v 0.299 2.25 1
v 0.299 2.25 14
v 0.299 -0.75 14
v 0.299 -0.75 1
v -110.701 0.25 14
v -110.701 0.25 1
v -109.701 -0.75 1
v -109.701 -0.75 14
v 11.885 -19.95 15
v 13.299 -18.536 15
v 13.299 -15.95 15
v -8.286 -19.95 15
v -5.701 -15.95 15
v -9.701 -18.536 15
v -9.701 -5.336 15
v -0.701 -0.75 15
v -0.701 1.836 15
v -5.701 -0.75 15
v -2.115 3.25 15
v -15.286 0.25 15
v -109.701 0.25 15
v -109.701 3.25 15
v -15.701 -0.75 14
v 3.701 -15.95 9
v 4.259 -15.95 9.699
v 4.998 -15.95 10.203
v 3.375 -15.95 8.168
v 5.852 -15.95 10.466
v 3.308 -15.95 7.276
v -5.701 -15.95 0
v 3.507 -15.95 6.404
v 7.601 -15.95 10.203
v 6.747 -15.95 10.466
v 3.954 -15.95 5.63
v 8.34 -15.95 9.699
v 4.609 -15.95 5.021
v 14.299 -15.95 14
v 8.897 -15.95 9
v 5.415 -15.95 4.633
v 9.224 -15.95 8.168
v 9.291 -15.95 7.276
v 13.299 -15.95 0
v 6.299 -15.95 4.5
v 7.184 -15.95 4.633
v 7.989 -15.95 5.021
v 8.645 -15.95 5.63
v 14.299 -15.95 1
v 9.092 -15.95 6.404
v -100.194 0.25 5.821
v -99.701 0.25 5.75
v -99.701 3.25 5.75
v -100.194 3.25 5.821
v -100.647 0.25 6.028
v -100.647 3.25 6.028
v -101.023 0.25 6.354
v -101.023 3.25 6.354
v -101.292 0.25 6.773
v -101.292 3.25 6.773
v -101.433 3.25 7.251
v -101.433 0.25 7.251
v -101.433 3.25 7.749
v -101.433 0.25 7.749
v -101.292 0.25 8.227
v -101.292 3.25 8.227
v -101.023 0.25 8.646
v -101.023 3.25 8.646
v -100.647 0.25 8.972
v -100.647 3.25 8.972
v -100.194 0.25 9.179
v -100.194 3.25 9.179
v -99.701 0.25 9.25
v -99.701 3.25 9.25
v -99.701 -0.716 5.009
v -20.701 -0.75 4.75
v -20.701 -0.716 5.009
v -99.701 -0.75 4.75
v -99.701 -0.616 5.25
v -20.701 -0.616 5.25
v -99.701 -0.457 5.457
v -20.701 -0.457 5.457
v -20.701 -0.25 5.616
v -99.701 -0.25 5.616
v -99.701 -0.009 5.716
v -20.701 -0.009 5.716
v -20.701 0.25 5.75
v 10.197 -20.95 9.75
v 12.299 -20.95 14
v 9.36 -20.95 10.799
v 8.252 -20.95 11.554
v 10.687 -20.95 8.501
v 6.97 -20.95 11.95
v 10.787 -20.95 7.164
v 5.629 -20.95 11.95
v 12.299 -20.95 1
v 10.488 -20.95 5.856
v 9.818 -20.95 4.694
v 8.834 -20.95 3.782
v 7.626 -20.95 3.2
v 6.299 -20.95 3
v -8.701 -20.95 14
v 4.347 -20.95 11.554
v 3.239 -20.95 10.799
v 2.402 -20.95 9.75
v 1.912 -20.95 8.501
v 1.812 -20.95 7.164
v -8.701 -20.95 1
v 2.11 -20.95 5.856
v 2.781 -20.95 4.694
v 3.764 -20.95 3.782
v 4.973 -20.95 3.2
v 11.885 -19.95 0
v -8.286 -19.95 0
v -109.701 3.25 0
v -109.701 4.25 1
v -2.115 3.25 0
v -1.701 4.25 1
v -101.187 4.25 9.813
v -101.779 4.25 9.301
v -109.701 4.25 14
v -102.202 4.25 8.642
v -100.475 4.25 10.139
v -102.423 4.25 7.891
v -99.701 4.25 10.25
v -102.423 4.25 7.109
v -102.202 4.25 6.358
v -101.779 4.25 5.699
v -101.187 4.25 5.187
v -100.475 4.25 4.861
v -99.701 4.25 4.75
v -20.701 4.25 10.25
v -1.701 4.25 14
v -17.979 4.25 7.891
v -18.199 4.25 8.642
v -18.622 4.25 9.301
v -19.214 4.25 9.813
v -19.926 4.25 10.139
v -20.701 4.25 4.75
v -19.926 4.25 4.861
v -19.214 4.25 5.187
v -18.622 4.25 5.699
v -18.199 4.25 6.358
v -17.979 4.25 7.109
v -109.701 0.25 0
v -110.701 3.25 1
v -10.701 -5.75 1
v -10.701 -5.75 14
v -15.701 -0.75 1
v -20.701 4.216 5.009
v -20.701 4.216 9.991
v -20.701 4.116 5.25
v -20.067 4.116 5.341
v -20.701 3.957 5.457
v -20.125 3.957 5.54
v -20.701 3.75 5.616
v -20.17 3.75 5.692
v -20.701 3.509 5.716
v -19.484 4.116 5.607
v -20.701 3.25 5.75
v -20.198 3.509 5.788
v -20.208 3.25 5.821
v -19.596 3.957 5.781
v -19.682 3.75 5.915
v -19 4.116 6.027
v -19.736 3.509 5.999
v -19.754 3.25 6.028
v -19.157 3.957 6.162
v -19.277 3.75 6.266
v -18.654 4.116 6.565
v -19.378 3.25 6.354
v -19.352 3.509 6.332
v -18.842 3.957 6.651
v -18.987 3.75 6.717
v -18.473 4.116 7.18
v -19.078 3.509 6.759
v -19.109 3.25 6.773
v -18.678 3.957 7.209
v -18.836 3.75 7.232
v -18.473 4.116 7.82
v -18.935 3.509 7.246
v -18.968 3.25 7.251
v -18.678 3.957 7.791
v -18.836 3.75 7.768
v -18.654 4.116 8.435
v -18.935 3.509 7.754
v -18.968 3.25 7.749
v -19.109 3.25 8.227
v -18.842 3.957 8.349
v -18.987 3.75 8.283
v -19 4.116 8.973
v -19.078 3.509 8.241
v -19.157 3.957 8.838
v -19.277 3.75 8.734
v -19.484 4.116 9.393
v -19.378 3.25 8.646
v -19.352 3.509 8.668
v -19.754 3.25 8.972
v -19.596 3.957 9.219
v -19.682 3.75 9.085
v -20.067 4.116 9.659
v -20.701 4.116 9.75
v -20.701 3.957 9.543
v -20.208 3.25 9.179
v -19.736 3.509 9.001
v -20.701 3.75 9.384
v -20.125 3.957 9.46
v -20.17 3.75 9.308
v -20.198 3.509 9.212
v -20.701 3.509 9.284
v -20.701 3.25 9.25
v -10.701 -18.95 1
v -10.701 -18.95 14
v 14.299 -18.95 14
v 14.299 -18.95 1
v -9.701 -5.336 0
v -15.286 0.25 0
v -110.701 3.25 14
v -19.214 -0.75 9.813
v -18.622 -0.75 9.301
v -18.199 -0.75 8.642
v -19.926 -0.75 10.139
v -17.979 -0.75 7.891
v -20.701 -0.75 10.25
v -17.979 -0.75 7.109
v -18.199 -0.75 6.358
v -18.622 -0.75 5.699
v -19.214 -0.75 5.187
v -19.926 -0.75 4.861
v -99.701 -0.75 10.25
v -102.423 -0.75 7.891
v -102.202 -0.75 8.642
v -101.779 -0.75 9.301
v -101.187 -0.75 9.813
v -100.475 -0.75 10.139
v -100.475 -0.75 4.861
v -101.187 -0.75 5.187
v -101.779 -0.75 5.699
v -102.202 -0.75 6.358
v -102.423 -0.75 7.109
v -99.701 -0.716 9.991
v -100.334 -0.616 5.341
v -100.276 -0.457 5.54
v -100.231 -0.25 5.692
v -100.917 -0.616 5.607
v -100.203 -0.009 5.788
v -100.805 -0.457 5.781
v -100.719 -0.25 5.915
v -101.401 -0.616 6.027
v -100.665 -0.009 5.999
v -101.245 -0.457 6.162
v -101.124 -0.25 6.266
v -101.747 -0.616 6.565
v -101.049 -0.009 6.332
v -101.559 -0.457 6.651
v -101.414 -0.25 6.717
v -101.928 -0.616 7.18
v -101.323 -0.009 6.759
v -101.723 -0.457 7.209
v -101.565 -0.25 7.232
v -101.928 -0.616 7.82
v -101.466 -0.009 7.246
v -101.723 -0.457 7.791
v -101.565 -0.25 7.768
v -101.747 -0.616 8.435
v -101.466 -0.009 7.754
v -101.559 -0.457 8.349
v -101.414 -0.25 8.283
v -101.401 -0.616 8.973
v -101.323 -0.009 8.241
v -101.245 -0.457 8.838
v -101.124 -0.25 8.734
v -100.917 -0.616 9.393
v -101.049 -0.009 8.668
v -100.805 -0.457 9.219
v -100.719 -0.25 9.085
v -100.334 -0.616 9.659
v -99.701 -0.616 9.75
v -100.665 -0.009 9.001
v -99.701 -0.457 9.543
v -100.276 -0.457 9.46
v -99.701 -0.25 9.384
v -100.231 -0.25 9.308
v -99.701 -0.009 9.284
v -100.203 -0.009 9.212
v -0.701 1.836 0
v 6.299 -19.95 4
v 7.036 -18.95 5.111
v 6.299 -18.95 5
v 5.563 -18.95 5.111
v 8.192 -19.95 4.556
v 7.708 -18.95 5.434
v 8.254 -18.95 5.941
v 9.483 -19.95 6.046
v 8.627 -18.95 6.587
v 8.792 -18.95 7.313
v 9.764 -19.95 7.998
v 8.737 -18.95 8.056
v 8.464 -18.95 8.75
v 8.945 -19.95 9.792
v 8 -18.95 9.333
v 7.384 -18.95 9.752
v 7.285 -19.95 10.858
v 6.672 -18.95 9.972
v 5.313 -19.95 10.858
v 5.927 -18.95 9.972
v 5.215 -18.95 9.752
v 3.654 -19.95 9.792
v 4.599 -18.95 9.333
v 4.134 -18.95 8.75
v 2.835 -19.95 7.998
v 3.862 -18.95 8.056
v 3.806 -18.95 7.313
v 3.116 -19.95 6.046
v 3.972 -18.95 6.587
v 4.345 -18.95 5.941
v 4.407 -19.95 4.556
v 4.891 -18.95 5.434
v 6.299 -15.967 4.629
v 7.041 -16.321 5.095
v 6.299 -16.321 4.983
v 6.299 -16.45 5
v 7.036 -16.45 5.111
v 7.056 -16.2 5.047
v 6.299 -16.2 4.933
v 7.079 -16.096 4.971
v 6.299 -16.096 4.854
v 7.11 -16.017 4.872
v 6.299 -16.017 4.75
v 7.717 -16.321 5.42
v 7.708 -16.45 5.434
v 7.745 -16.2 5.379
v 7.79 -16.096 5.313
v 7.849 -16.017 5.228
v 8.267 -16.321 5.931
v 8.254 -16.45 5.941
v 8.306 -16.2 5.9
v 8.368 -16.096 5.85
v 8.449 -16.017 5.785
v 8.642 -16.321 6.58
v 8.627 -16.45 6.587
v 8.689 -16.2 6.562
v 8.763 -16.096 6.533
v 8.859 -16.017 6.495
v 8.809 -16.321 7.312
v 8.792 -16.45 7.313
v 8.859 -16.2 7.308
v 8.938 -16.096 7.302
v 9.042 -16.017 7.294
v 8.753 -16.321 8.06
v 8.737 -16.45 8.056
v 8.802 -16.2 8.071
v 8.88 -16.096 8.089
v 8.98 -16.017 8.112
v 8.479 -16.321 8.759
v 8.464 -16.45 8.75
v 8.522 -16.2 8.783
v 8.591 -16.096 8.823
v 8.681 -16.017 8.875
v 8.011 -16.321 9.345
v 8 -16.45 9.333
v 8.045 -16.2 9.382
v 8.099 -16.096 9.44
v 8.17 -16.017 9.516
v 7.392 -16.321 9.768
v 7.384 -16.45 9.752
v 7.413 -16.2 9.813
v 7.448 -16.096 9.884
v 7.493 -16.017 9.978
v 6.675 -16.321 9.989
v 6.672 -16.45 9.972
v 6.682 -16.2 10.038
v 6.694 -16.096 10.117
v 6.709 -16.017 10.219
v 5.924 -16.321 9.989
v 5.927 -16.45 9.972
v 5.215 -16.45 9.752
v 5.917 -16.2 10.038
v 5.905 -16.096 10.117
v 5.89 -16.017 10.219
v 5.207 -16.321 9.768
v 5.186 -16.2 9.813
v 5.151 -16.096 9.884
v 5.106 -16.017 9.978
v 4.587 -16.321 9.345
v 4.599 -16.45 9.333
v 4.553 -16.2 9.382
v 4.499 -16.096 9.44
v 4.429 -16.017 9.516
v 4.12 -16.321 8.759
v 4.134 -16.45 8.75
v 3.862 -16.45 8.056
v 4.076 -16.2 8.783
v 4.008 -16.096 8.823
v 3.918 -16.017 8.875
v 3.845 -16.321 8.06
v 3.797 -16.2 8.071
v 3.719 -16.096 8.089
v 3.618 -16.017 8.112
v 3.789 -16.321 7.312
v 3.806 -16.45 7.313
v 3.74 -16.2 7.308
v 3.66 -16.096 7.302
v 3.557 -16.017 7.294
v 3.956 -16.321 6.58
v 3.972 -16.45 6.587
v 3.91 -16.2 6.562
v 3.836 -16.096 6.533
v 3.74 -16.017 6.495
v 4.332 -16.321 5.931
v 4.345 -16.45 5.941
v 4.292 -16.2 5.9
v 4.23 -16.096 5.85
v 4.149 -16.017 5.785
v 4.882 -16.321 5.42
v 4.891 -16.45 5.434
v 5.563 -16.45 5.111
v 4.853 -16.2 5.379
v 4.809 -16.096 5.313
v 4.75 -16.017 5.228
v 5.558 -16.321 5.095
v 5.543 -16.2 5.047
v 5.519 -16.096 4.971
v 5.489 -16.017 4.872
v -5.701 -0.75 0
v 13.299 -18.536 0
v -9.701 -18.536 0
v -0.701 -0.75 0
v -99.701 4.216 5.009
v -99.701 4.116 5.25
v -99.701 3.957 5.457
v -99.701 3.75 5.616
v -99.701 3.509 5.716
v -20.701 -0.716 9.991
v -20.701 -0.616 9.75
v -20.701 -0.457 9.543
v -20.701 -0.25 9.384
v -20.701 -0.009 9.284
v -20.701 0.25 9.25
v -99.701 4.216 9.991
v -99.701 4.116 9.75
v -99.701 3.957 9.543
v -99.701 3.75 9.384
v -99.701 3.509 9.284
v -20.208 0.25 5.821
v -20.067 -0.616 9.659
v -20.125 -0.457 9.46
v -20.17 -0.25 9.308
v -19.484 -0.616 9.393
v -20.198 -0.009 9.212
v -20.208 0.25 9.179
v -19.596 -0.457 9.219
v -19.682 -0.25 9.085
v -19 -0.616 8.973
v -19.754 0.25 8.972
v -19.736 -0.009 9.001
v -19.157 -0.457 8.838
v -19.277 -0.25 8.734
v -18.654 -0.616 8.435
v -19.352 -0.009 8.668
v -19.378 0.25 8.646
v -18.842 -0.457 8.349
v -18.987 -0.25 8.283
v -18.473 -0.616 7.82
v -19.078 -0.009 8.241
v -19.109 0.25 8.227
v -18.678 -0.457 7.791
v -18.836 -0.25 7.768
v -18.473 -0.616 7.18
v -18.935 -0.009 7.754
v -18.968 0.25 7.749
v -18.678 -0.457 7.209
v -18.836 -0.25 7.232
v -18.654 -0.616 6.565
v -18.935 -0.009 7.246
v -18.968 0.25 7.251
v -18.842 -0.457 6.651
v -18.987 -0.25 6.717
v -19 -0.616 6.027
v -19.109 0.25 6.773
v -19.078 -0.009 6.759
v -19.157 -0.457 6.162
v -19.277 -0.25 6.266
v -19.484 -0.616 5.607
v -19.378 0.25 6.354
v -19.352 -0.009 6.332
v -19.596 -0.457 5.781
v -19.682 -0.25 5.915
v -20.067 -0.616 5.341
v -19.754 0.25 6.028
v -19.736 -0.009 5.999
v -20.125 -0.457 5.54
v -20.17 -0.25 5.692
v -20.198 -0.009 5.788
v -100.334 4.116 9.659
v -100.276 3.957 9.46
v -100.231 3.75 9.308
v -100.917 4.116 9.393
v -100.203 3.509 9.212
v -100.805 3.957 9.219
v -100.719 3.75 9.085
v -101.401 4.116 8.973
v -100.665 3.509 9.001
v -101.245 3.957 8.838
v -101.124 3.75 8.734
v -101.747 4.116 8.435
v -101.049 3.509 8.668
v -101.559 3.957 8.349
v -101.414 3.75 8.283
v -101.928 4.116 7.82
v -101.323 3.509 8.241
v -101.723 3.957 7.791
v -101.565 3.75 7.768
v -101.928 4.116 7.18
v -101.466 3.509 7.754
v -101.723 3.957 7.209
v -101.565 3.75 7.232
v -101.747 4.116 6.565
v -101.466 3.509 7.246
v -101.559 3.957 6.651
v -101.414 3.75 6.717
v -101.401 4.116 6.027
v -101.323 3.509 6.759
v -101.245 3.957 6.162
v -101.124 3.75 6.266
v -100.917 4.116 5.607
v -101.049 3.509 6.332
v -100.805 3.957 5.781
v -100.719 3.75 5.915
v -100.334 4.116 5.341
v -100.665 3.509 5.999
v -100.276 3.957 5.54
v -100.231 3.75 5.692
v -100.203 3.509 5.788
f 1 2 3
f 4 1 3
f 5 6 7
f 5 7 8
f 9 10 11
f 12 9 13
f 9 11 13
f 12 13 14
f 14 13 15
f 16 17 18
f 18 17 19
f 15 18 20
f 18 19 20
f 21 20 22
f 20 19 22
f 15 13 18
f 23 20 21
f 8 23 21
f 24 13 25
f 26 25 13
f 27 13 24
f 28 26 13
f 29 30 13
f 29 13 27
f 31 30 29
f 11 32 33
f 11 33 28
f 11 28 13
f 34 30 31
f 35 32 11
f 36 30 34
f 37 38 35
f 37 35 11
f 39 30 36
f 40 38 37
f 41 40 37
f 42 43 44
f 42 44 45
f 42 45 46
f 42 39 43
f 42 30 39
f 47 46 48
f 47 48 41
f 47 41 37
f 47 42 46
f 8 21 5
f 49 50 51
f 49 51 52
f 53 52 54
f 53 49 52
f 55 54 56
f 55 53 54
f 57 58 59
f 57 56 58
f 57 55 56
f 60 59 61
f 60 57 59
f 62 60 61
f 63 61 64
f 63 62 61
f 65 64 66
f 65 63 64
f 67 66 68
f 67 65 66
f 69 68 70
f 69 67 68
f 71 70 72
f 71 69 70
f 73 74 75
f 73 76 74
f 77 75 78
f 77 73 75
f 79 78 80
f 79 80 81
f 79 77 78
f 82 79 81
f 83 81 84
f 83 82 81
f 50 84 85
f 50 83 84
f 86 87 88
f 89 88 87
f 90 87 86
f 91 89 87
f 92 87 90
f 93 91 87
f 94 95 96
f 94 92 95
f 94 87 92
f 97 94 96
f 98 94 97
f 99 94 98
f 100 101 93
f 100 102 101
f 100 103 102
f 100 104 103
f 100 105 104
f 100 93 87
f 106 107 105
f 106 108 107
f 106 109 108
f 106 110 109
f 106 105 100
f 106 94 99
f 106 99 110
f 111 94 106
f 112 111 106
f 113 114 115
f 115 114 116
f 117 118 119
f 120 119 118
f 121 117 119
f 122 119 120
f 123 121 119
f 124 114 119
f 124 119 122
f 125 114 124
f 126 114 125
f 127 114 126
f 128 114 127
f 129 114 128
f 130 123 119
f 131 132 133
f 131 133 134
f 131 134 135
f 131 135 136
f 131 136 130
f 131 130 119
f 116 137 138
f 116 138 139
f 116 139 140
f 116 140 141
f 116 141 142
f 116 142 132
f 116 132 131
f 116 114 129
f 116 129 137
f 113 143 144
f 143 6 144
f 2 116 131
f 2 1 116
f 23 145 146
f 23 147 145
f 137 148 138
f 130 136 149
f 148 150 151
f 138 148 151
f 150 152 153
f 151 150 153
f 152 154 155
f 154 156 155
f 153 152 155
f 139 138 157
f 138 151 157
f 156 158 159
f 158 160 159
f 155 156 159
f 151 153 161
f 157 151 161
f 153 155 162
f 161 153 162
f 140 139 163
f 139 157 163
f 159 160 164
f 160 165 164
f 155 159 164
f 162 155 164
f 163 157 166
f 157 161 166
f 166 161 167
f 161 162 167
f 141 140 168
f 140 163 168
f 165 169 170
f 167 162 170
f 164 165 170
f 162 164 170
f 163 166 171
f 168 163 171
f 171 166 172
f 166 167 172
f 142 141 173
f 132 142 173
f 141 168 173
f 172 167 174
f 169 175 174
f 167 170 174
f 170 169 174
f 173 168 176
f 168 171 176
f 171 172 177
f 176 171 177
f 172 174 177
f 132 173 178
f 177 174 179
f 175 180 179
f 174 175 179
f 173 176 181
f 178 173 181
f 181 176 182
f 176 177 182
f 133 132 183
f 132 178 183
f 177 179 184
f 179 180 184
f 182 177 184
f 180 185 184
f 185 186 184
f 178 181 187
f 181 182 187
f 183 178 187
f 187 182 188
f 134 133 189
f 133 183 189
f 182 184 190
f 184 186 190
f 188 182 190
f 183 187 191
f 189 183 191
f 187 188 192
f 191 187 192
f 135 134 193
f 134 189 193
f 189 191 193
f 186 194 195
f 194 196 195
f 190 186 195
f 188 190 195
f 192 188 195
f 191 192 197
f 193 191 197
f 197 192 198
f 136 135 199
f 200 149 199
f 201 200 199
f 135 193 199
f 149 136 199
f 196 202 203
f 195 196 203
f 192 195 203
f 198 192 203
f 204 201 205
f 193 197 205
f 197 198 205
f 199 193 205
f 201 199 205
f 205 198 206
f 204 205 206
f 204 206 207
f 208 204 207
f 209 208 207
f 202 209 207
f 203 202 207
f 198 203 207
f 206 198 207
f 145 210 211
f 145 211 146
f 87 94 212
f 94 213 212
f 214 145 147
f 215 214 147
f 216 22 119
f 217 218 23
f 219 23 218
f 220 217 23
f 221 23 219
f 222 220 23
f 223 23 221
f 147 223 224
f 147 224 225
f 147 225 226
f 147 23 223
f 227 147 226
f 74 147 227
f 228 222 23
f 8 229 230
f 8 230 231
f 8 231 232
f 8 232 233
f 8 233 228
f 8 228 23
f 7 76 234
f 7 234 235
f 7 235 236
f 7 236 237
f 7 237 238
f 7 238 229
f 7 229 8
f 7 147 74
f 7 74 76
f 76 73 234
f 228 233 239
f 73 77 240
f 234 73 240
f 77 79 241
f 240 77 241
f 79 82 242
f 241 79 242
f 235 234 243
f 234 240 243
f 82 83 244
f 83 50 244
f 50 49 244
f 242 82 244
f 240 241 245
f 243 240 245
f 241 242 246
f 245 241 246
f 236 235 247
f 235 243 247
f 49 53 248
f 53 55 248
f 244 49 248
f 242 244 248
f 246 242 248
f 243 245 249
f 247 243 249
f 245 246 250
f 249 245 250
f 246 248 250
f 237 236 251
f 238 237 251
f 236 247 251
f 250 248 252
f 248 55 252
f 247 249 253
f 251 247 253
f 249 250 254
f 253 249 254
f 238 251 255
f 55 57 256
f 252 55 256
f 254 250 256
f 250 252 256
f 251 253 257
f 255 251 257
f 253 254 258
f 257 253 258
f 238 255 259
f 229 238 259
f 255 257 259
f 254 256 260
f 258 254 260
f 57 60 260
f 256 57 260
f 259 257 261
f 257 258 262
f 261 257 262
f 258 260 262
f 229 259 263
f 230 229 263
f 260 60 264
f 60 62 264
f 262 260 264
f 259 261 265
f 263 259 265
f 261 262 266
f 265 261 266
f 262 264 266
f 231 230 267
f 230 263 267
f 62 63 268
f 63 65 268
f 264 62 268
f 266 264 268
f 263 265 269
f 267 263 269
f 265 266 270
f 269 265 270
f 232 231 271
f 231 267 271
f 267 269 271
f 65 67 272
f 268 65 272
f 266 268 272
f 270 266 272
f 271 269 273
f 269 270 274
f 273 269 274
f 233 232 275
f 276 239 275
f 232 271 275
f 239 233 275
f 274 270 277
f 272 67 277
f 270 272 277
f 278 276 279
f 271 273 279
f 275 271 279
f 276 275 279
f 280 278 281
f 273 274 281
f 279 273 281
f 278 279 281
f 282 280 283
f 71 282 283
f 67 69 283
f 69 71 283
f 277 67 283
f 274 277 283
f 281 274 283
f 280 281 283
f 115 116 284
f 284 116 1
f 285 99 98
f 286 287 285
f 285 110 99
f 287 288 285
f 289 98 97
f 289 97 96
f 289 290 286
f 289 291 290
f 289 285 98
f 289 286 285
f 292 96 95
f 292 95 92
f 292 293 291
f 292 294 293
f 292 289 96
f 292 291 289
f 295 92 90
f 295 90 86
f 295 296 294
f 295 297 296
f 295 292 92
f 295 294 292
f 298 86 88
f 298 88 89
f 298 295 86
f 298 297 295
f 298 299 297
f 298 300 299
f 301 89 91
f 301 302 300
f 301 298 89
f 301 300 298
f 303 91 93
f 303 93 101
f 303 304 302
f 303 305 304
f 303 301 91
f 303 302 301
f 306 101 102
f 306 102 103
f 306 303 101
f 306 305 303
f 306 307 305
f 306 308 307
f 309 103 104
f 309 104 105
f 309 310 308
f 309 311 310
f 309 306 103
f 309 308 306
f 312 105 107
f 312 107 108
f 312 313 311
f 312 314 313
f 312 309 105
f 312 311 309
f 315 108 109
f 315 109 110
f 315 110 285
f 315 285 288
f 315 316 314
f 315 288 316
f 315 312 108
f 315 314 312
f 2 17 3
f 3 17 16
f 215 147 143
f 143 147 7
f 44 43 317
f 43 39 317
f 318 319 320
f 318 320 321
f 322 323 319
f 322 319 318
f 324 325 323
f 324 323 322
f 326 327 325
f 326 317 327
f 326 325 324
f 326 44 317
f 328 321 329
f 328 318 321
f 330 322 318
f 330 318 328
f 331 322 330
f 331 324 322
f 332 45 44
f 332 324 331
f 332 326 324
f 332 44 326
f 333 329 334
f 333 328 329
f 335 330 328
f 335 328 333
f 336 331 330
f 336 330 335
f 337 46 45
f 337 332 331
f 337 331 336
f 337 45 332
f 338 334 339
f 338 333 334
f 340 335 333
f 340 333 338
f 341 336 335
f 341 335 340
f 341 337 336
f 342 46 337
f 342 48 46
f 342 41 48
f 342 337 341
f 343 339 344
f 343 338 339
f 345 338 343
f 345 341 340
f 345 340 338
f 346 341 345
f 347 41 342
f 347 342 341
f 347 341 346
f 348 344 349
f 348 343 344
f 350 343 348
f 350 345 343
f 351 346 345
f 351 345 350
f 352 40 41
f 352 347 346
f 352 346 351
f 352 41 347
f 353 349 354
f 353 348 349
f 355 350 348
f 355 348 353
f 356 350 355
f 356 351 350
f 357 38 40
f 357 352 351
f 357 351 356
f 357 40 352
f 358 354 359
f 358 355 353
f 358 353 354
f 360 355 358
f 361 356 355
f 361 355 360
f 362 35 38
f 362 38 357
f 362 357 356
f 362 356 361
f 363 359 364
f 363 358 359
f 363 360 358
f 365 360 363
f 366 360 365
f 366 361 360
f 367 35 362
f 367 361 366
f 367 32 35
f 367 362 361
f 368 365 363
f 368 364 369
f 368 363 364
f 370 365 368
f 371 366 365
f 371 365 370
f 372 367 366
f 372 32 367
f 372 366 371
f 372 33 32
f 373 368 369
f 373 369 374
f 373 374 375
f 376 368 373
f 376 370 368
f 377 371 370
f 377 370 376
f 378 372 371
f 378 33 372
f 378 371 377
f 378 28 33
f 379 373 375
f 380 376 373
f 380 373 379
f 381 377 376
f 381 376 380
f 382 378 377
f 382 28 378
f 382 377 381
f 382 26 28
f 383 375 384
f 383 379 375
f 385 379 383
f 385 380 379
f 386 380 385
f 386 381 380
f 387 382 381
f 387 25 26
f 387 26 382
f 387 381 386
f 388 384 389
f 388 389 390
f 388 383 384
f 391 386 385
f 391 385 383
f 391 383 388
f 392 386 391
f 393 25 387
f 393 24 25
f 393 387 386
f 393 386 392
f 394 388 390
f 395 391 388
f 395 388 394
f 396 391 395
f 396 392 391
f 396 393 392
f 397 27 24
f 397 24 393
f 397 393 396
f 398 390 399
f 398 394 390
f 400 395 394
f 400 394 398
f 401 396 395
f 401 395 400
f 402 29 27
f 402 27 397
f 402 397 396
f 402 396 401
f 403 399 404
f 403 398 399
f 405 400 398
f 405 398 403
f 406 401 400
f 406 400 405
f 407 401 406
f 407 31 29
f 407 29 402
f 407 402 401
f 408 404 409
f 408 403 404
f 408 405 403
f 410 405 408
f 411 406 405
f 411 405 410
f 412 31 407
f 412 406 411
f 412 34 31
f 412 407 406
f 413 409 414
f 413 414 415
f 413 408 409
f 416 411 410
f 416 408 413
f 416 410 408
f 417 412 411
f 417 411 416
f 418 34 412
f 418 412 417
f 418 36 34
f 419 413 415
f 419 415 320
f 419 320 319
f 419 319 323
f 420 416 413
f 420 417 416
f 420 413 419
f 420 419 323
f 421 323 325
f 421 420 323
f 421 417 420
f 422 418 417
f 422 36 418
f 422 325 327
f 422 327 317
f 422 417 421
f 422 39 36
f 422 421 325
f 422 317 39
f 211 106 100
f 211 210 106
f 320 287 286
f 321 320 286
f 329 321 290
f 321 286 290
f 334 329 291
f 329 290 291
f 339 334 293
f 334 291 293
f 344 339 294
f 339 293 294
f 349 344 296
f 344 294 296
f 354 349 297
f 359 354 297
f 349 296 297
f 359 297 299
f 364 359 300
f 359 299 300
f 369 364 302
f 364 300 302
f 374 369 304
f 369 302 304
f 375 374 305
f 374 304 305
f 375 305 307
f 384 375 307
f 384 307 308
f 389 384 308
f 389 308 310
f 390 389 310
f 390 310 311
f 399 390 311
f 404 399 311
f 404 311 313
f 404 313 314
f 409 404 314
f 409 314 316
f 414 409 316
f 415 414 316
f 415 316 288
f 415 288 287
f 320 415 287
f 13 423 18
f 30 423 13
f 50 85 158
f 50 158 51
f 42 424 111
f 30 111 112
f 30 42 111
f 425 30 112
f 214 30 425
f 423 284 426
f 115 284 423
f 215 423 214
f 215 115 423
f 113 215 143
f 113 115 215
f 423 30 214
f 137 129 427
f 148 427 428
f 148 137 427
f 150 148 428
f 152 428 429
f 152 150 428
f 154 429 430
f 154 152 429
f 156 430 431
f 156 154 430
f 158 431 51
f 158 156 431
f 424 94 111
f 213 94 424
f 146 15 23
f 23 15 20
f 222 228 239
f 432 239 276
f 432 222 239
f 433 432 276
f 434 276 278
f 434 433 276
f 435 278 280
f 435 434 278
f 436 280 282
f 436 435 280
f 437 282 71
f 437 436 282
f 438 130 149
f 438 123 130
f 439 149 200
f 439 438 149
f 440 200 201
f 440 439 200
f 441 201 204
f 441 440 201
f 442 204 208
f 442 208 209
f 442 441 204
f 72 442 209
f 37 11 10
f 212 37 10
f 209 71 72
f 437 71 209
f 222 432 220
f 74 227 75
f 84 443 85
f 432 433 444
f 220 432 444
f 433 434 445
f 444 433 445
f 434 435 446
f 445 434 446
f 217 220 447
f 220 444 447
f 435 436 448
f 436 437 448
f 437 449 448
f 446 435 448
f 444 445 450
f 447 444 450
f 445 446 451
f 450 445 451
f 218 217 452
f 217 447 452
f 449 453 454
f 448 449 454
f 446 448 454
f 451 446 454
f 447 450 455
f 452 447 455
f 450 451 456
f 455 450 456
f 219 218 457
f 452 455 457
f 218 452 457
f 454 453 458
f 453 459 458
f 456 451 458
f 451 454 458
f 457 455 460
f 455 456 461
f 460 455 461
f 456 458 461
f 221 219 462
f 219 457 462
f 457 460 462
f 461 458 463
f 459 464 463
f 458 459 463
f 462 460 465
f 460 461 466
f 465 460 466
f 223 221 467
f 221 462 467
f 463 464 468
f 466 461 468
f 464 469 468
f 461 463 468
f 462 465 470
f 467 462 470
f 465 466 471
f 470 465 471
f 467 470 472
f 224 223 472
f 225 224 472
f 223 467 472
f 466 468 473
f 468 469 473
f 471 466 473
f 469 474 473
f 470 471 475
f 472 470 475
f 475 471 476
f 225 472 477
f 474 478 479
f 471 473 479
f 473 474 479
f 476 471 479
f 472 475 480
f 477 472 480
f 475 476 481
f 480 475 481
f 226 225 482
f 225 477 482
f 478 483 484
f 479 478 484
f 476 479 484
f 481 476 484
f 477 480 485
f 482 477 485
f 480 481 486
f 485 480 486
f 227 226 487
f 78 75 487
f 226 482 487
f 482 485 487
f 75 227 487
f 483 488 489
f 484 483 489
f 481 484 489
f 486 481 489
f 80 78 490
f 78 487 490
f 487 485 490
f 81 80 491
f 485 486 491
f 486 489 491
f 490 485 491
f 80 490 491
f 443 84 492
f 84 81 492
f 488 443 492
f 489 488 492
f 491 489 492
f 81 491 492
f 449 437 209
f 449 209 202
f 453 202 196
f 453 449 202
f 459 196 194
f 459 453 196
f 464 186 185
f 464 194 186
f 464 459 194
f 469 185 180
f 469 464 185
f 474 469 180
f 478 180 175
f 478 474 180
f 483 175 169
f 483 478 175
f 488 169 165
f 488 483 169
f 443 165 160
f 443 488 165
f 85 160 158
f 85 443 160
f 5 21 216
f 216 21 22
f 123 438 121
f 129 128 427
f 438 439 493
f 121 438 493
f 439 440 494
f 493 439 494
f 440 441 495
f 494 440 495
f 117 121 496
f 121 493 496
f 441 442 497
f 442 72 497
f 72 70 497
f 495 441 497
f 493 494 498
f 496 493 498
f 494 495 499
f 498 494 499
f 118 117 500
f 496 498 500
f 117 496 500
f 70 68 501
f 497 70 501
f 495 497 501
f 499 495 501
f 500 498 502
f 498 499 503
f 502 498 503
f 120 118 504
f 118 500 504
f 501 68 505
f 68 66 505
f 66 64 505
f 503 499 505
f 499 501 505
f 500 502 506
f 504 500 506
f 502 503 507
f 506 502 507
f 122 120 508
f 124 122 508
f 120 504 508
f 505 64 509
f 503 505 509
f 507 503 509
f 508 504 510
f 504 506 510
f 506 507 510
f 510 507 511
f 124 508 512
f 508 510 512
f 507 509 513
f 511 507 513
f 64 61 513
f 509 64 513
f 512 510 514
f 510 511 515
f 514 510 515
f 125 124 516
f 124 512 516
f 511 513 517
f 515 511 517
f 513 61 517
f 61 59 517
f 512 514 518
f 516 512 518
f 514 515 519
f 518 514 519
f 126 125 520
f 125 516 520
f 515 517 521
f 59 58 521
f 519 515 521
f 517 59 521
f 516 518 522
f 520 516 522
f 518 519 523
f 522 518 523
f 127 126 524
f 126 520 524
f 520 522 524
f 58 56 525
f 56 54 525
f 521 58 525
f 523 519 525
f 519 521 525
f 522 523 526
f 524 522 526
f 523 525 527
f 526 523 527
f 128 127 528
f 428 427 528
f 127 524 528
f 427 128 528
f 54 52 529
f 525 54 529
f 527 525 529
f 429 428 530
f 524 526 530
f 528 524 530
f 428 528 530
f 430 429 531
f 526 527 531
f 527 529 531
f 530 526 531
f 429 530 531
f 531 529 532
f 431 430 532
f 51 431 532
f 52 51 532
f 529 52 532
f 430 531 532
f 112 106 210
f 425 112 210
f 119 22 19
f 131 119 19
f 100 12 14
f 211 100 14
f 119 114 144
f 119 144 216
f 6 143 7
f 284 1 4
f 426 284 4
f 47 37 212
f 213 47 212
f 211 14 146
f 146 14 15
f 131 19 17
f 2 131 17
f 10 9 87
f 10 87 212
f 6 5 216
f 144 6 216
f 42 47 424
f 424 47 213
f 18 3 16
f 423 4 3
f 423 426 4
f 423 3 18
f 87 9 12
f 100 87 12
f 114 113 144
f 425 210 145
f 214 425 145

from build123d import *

# Parameters (mm, degrees)
RESSALTO_EXTRUS_O1_DEPTH = 15
ESBO_O3_R                = 2.5
CORTE_EXTRUS_O1_DEPTH    = 15
CHANFRO1_SIZE            = 2
FILETE1_R                = 0.5
CHANFRO5_SIZE            = 2
CHANFRO7_SIZE            = 5
CHANFRO9_SIZE            = 1
CORTE_EXTRUS_O2_DEPTH    = 10
FILETE2_R                = 1


with BuildPart() as part:
    # Esboço1 → Ressalto-extrusão1 (new body)
    with BuildSketch(Plane.XY):
        Polygon((0.299414955, -0.75), (-5.700585045, -0.75), (-5.700585045, -15.95), (14.299414955, -15.95), (14.299414955, -20.95), (-10.700585045, -20.95), (-10.700585045, -0.75), (-110.700585045, -0.75), (-110.700585045, 4.25), (0.299414955, 4.25), align=None)
    extrude(amount=RESSALTO_EXTRUS_O1_DEPTH)

    # Esboço3 → Corte-extrusão1 (cut)
    with BuildSketch(Plane.XZ.offset(20.95)):
        with Locations(Location((6.299414955, 7.5, 0), (0, 0, 270))):
            Circle(ESBO_O3_R)
    extrude(amount=-CORTE_EXTRUS_O1_DEPTH, mode=Mode.SUBTRACT)

    # Chanfro1
    chanfro1_edges = [part.edges().sort_by_distance(p)[0] for p in [
        (6.299414955, -20.95, 10),
    ]]
    chamfer(chanfro1_edges, length=CHANFRO1_SIZE)

    # Filete1
    filete1_edges = [part.edges().sort_by_distance(p)[0] for p in [
        (6.299414955, -15.95, 10),
    ]]
    fillet(filete1_edges, radius=FILETE1_R)

    # Chanfro5
    chanfro5_edges = [part.edges().sort_by_distance(p)[0] for p in [
        (14.299414955, -20.95, 7.5),
        (-10.700585045, -20.95, 7.5),
        (0.299414955, 4.25, 7.5),
    ]]
    chamfer(chanfro5_edges, length=CHANFRO5_SIZE)

    # Chanfro7
    chanfro7_edges = [part.edges().sort_by_distance(p)[0] for p in [
        (-10.700585045, -0.75, 7.5),
    ]]
    chamfer(chanfro7_edges, length=CHANFRO7_SIZE)

    # Chanfro9
    chanfro9_edges = [part.edges().sort_by_distance(p)[0] for p in [
        (13.299414955, -19.95, 0),
        (14.299414955, -17.45, 0),
        (0.299414955, 0.75, 0),
        (-0.700585045, 3.25, 0),
        (-56.200585045, 4.25, 0),
        (-110.700585045, 1.75, 0),
        (-63.200585045, -0.75, 0),
        (-13.200585045, -3.25, 0),
        (-10.700585045, -12.35, 0),
        (-9.700585045, -19.95, 0),
        (1.799414955, -20.95, 0),
        (-110.700585045, 1.75, 15),
        (-56.200585045, 4.25, 15),
        (-0.700585045, 3.25, 15),
        (0.299414955, 0.75, 15),
        (14.299414955, -17.45, 15),
        (13.299414955, -19.95, 15),
        (1.799414955, -20.95, 15),
        (-9.700585045, -19.95, 15),
        (-10.700585045, -12.35, 15),
        (-13.200585045, -3.25, 15),
        (-63.200585045, -0.75, 15),
        (-110.700585045, 4.25, 7.5),
        (-110.700585045, -0.75, 7.5),
    ]]
    chamfer(chanfro9_edges, length=CHANFRO9_SIZE)

    # Esboço4 → Corte-extrusão2 (cut)
    with BuildSketch(Plane.XZ.offset(0.75)):
        with BuildLine():
            Line((-99.700585045, 9.25), (-20.700585045, 9.25))
            ThreePointArc((-20.700585045, 9.25), (-18.950585045, 7.5), (-20.700585045, 5.75))
            Line((-20.700585045, 5.75), (-99.700585045, 5.75))
            ThreePointArc((-99.700585045, 5.75), (-101.450585045, 7.5), (-99.700585045, 9.25))
        make_face()
    extrude(amount=-CORTE_EXTRUS_O2_DEPTH, mode=Mode.SUBTRACT)

    # Filete2
    filete2_edges = [part.edges().sort_by_distance(p)[0] for p in [
        (-101.450585045, 4.25, 7.5),
        (-60.200585045, 4.25, 9.25),
        (-18.950585045, 4.25, 7.5),
        (-60.200585045, 4.25, 5.75),
        (-101.450585045, -0.75, 7.5),
        (-60.200585045, -0.75, 5.75),
        (-18.950585045, -0.75, 7.5),
        (-60.200585045, -0.75, 9.25),
    ]]
    fillet(filete2_edges, radius=FILETE2_R)


solid = part.part
